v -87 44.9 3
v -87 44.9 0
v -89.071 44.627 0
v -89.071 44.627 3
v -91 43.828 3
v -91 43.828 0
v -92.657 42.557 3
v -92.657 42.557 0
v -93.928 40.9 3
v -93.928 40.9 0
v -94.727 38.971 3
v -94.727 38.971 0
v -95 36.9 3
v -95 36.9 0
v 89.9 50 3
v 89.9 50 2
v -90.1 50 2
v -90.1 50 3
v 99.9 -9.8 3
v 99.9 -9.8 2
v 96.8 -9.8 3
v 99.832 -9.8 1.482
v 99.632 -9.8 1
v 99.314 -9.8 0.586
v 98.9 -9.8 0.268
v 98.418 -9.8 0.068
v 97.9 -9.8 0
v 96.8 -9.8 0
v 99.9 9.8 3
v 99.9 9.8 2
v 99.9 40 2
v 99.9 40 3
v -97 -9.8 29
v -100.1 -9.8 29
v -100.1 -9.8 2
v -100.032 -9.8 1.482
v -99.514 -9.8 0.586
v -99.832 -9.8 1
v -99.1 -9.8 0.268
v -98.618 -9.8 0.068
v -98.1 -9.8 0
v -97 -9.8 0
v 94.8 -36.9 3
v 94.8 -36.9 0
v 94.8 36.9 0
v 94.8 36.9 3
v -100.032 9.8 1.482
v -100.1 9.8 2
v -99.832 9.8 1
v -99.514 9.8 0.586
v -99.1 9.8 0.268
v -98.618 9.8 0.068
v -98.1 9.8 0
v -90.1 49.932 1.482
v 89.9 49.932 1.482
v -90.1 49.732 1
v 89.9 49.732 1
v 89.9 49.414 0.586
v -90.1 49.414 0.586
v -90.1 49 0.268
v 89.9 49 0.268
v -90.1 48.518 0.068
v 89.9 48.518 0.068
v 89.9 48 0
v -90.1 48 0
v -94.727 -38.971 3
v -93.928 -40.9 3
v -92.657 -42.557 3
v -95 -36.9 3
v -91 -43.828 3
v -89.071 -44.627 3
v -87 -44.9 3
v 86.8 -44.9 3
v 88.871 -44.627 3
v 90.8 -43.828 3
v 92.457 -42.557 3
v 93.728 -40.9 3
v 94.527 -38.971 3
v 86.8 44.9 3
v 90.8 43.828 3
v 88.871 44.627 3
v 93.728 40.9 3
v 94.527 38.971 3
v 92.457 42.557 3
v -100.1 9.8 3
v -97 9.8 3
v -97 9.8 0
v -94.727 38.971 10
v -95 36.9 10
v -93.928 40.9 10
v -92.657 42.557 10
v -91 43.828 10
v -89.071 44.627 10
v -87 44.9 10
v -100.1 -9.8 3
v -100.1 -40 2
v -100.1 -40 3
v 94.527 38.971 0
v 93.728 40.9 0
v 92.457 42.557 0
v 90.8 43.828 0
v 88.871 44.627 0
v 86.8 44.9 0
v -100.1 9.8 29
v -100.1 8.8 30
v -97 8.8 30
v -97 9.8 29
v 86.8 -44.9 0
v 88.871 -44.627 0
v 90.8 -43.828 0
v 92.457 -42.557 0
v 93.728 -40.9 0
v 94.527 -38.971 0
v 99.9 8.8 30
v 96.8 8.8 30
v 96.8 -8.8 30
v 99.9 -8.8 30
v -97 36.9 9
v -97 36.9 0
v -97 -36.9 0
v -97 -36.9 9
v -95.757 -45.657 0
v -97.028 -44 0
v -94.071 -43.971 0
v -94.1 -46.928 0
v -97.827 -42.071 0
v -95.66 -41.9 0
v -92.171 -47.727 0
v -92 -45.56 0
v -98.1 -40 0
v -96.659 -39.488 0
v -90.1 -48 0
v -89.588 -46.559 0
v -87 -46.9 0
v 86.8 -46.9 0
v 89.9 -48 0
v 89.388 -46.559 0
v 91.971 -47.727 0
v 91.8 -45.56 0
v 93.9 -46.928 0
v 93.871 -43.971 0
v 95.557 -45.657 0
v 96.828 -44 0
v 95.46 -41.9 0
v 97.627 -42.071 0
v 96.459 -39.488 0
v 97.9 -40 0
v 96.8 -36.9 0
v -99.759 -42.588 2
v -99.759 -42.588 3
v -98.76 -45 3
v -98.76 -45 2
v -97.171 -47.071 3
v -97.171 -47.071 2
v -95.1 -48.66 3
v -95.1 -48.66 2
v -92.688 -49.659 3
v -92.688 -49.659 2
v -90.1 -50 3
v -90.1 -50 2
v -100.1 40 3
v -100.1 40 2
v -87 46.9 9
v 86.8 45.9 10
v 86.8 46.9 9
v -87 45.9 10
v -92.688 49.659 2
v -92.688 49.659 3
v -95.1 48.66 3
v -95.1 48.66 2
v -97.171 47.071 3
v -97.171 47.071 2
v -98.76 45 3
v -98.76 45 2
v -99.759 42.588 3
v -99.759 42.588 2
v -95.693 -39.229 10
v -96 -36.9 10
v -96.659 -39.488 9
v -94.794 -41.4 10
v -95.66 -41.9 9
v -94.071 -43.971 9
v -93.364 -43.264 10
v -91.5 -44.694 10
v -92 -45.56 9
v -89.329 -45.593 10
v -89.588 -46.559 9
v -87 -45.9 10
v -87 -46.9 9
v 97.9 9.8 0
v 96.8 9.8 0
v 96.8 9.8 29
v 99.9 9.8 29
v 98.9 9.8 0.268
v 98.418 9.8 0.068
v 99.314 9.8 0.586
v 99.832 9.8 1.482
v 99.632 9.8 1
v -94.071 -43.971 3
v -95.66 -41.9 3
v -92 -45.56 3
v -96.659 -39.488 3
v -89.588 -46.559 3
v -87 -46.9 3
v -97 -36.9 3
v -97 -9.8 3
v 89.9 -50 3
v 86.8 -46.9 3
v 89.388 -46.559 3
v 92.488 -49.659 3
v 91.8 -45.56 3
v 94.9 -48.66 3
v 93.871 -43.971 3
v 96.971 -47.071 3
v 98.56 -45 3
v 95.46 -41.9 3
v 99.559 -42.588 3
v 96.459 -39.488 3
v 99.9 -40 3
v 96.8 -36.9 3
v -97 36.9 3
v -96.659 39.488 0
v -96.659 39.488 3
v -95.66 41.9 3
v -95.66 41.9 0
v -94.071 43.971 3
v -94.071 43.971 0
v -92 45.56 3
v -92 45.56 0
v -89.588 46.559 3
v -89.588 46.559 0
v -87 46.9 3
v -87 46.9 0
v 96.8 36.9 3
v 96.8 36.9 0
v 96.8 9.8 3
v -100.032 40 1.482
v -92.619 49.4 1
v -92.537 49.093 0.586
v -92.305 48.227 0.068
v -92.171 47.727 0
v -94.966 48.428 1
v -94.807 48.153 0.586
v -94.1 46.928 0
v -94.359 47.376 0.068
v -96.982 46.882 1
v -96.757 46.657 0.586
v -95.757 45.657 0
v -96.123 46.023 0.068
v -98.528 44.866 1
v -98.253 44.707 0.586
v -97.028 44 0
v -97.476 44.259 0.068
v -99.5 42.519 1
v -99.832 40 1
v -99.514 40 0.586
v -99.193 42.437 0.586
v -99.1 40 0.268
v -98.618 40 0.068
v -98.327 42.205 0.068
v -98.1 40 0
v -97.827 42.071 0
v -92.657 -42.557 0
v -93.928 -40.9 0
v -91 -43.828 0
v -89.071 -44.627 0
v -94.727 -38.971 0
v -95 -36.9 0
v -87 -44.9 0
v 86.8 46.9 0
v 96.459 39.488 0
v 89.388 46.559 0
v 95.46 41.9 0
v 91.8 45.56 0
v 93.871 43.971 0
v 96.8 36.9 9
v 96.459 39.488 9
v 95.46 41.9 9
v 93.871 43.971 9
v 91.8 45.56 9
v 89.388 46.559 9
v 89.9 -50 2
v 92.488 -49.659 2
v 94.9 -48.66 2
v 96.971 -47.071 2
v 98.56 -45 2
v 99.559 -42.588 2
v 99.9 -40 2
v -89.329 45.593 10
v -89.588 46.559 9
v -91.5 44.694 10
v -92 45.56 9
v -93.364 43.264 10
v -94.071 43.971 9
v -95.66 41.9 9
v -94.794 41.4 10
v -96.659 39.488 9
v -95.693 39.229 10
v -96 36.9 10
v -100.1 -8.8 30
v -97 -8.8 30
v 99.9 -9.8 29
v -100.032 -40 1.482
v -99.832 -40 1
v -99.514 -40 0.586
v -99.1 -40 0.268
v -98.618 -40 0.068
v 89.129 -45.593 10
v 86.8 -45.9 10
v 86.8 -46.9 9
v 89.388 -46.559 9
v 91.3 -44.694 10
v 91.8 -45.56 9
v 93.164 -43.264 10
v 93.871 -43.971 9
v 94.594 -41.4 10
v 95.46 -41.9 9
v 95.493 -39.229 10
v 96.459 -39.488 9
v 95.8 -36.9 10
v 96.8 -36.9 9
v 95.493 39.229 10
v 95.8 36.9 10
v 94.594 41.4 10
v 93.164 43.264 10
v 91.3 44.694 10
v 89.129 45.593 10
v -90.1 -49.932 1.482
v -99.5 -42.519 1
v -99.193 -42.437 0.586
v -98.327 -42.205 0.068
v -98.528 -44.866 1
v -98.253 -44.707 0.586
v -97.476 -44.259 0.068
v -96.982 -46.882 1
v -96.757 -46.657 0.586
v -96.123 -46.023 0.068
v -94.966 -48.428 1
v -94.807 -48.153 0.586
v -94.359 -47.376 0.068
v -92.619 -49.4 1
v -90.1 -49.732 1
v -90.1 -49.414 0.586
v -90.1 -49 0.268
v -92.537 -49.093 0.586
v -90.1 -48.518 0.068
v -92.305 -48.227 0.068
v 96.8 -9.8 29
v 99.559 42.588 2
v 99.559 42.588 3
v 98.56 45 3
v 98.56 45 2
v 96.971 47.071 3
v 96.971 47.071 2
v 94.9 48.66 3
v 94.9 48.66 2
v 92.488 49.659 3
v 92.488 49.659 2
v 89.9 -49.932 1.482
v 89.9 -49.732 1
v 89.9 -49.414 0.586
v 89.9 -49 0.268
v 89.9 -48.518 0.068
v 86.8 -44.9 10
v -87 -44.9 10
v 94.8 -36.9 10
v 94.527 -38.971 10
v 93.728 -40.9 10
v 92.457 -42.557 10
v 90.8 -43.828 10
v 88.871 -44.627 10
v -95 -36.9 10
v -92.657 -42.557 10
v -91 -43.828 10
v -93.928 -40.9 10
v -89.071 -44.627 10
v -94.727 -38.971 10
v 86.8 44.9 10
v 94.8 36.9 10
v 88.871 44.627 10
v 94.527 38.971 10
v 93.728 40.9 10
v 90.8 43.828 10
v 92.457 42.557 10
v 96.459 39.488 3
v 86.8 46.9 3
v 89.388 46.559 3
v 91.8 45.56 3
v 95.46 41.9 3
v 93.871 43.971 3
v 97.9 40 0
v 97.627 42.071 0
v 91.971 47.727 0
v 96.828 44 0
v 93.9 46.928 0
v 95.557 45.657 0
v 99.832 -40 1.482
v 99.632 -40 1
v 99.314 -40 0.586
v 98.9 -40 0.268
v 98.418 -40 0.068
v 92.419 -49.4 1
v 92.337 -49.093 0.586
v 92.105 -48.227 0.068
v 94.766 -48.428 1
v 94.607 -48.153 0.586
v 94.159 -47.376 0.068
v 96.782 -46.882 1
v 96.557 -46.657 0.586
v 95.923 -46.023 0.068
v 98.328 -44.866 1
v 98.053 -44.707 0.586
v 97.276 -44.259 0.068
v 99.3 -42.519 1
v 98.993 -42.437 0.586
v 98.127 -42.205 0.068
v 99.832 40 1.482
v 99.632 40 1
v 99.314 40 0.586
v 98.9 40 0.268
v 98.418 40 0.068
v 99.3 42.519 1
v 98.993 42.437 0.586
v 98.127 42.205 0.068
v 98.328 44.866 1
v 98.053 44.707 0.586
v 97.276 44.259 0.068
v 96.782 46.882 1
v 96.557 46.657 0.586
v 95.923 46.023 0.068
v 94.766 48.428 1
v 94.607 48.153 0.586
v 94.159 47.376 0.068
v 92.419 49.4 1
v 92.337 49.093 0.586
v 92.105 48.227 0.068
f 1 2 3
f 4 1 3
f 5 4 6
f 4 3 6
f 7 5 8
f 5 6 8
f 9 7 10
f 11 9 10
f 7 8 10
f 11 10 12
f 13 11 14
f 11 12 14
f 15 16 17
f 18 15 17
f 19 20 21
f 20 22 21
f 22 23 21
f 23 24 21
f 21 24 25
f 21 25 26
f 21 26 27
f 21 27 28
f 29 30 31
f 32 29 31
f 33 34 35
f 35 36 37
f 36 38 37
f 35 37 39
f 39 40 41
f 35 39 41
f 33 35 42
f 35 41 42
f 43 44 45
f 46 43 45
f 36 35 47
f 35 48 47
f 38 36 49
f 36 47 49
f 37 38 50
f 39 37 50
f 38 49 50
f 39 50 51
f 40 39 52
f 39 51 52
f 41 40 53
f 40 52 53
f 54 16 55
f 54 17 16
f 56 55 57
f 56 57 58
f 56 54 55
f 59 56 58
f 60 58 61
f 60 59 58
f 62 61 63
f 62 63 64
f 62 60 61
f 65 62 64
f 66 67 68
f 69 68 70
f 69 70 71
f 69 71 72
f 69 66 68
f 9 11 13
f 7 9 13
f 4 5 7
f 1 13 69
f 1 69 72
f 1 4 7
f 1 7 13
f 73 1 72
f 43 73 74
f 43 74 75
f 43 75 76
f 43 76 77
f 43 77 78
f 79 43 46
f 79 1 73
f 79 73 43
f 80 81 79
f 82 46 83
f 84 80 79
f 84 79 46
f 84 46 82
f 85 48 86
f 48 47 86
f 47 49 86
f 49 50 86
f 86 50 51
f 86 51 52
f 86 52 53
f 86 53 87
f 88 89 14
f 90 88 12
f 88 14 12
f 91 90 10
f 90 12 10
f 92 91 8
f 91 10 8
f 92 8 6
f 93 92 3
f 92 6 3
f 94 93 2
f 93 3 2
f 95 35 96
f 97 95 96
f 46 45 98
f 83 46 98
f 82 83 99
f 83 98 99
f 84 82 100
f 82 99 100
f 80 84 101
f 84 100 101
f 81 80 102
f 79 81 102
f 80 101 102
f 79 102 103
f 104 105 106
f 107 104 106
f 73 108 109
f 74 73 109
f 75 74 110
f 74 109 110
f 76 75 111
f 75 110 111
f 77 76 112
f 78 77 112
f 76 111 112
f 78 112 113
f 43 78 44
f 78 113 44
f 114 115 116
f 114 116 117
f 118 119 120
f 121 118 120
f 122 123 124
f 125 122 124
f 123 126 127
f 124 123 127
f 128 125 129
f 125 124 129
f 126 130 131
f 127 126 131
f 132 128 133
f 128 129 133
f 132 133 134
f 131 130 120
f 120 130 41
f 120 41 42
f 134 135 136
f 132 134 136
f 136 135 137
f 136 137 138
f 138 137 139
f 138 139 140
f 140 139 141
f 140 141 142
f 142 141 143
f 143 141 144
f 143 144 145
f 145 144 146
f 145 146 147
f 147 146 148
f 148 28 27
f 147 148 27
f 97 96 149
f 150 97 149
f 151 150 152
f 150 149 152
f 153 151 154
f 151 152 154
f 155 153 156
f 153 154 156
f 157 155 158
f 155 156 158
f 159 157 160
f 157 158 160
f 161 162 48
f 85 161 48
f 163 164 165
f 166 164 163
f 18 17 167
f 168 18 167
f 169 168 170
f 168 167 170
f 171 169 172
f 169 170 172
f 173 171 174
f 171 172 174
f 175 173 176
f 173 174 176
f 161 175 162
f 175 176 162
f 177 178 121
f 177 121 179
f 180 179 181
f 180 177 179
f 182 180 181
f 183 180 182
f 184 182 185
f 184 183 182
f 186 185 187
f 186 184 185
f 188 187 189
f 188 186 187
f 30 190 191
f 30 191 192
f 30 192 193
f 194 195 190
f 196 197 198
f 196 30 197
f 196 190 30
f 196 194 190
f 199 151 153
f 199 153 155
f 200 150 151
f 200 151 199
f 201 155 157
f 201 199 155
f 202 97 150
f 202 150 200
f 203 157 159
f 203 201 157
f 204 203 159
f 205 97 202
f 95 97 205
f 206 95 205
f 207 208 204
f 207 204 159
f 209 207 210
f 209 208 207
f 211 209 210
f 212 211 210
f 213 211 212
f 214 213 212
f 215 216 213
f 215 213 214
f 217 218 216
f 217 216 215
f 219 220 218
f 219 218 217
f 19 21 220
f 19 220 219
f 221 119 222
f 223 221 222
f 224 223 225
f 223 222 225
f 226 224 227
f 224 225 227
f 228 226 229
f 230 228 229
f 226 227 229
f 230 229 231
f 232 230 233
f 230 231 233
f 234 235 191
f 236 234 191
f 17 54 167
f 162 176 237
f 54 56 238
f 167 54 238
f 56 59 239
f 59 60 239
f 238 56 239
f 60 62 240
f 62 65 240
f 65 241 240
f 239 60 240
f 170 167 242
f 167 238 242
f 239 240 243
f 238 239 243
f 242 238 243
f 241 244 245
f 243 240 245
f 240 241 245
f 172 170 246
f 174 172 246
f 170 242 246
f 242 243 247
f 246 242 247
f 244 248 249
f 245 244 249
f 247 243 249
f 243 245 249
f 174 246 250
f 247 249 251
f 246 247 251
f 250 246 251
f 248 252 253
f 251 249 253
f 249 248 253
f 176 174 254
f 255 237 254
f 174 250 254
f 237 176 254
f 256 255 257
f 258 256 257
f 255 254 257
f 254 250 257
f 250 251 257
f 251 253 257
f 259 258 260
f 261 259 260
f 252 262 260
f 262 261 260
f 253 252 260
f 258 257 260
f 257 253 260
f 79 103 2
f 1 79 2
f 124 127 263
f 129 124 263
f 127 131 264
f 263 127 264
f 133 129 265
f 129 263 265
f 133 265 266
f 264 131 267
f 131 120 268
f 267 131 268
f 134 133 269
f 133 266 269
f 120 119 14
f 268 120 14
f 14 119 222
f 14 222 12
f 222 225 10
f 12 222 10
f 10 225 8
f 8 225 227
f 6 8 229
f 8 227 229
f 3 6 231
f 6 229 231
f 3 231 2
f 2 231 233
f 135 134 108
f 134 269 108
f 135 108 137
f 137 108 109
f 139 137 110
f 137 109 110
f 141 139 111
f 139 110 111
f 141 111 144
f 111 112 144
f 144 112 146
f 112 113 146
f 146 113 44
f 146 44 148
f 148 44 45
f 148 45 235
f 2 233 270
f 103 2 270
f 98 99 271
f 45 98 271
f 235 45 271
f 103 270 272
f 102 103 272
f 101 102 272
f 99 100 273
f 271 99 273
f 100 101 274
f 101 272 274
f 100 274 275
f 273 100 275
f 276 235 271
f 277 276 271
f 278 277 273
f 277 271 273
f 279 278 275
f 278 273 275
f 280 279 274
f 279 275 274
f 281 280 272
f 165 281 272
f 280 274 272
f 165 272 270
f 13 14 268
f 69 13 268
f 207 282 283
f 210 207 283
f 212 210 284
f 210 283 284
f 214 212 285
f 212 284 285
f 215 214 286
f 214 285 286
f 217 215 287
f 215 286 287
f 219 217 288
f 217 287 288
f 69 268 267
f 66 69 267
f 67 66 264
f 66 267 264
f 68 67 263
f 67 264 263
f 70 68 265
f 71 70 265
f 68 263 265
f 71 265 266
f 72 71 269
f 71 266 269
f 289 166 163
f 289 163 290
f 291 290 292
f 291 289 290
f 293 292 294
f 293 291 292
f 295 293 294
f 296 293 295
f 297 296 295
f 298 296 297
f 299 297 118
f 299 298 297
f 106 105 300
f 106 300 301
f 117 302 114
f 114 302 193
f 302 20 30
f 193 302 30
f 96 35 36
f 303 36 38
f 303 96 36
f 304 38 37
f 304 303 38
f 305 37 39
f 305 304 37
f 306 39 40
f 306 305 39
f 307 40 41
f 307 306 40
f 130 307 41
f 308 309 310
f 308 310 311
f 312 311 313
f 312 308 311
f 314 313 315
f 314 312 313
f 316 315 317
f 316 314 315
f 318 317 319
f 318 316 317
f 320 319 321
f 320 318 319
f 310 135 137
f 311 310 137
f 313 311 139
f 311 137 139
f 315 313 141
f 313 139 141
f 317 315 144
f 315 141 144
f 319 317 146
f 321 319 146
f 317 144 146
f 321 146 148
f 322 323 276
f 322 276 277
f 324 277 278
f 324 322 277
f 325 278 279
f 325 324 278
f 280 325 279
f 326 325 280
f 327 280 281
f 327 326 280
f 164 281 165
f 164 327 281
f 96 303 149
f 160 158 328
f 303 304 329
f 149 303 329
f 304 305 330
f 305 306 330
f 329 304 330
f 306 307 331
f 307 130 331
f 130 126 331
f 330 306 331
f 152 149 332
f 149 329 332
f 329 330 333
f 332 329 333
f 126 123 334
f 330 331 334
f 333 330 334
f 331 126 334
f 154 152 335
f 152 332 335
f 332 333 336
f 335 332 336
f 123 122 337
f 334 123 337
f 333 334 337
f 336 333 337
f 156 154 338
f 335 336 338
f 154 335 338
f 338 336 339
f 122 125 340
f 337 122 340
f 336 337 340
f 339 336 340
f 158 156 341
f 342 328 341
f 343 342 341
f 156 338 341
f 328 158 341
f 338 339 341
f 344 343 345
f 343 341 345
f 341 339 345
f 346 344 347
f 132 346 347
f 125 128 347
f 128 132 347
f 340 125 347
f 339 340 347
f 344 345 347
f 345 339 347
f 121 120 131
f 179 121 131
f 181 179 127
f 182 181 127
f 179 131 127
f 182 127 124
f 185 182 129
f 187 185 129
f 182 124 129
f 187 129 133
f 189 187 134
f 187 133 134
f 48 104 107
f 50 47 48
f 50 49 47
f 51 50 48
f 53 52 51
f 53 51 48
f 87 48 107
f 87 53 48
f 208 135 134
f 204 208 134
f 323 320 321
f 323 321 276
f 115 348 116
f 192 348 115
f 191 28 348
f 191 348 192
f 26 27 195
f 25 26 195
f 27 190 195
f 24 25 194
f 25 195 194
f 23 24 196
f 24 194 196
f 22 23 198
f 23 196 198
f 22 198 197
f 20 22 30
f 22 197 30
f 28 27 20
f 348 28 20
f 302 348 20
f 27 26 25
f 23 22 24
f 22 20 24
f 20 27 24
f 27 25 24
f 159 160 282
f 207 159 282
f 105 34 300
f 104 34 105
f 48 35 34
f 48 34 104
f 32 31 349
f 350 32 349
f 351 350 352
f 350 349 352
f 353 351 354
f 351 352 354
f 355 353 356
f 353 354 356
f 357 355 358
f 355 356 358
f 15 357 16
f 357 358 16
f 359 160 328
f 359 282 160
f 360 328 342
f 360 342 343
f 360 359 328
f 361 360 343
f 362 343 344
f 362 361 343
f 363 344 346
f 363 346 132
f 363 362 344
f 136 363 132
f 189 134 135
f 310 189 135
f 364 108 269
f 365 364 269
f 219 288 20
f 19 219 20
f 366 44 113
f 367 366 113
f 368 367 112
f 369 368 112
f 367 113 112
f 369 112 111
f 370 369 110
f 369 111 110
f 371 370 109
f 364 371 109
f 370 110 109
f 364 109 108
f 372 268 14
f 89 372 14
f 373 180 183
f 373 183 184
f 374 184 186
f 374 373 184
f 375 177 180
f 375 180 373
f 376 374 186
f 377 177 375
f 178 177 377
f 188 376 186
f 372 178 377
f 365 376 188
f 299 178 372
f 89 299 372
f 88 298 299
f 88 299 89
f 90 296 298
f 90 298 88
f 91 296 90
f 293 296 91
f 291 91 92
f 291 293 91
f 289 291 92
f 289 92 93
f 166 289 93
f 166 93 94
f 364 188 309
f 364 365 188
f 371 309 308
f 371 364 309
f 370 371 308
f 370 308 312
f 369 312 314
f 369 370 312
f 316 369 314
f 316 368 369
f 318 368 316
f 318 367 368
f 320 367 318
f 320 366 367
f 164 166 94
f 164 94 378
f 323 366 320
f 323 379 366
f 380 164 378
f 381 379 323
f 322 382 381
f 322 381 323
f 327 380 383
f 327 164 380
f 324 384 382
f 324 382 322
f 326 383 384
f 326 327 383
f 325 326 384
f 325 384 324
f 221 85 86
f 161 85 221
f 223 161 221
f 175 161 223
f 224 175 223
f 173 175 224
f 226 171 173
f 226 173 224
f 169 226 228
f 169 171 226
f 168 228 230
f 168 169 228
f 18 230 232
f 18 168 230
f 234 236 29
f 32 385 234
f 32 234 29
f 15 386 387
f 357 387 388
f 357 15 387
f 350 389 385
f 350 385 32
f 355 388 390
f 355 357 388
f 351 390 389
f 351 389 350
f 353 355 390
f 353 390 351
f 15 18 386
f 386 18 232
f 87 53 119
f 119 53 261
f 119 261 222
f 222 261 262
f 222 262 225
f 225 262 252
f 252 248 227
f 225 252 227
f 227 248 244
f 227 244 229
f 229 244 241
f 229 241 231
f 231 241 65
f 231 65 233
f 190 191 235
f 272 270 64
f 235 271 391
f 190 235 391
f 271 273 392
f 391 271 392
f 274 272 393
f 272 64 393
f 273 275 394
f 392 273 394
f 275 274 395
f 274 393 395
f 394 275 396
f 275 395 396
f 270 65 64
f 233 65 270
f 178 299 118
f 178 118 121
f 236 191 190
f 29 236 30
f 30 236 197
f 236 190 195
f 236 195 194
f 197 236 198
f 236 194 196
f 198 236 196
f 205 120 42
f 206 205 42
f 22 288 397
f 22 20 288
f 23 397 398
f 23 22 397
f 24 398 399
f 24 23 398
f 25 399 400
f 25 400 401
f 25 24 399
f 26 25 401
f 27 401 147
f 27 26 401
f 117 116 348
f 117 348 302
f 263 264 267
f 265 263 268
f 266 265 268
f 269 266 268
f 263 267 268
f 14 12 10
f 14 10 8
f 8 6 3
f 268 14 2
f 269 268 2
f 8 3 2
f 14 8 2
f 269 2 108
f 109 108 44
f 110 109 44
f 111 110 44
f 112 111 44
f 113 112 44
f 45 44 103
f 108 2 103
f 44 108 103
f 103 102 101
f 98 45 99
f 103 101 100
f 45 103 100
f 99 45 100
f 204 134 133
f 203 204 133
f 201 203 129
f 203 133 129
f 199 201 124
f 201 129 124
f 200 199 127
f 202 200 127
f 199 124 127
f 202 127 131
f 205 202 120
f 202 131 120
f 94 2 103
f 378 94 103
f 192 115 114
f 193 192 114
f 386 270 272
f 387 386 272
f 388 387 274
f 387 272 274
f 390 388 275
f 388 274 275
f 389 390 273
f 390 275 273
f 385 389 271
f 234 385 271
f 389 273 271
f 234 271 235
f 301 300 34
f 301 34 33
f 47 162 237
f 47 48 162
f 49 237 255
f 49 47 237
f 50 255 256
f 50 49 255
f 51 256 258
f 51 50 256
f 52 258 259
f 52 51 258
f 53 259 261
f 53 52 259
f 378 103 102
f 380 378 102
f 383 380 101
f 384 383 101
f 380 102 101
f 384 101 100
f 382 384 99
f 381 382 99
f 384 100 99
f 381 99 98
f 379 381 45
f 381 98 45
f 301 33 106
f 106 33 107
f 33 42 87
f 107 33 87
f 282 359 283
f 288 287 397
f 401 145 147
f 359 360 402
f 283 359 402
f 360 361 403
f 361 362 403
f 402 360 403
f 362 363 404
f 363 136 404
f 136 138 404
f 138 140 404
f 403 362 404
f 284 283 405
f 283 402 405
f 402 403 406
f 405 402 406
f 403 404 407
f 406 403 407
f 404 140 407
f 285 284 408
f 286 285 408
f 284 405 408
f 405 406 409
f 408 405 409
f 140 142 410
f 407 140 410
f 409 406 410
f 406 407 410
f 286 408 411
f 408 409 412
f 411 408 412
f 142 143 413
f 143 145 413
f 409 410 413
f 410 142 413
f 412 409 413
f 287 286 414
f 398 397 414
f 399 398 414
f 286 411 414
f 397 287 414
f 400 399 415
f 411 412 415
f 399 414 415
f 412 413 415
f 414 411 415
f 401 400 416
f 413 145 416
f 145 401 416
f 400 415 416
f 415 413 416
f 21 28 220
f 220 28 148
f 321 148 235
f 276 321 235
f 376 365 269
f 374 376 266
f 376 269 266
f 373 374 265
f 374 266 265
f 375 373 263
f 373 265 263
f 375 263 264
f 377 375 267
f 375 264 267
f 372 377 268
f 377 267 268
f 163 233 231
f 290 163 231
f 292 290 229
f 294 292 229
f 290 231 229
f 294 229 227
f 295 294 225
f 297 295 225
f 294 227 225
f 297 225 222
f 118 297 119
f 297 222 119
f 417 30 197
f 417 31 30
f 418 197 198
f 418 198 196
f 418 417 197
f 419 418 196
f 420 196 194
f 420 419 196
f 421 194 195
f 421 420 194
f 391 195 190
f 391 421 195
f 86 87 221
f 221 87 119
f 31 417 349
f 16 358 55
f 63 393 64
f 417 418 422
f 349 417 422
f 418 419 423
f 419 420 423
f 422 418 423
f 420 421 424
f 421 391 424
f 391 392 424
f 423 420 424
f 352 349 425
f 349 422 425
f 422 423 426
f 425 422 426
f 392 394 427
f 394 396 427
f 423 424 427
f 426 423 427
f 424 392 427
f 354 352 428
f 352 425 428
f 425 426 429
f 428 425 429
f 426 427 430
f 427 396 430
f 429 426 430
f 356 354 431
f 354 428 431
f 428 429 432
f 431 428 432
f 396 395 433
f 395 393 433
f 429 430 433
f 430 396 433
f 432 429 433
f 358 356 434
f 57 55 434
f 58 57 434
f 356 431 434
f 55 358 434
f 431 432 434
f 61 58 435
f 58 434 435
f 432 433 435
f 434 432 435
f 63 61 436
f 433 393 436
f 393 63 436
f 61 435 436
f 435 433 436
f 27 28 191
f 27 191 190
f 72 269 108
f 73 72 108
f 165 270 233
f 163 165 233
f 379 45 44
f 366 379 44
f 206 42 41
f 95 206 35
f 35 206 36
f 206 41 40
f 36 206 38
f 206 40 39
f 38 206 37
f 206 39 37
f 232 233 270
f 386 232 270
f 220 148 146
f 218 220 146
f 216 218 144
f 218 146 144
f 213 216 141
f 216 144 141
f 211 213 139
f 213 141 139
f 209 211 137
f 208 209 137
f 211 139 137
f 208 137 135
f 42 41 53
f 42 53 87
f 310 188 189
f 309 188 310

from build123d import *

# Parameters (mm, degrees)
F1_DEPTH  = 3
F2_DEPTH  = 10
F0_W      = 3.1
F0_H      = 19.6
F3_DEPTH  = 30
F4_SIZE   = 1
F4_2_SIZE = 1
F5_R      = 2
F5_2_R    = 2


with BuildPart() as f1:
    # F0 (on Top) → F1 (new body)
    with BuildSketch(Plane.XY):
        with BuildLine():
            Line((96.8, 36.9), (96.8, 9.8))
            Line((96.8, 9.8), (99.9, 9.8))
            Line((99.9, 9.8), (99.9, 40))
            ThreePointArc((99.9, 40), (96.971068, 47.071068), (89.9, 50))
            Line((89.9, 50), (-90.1, 50))
            ThreePointArc((-90.1, 50), (-97.171068, 47.071068), (-100.1, 40))
            Line((-100.1, 40), (-100.1, 9.8))
            Line((-100.1, 9.8), (-97, 9.8))
            Line((-97, 9.8), (-97, 36.9))
            ThreePointArc((-97, 36.9), (-94.071068, 43.971068), (-87, 46.9))
            Line((-87, 46.9), (86.8, 46.9))
            ThreePointArc((86.8, 46.9), (93.871068, 43.971068), (96.8, 36.9))
        make_face()
        with BuildLine():
            ThreePointArc((94.8, 36.9), (92.456854, 42.556854), (86.8, 44.9))
            Line((86.8, 44.9), (-87, 44.9))
            ThreePointArc((-87, 44.9), (-92.656854, 42.556854), (-95, 36.9))
            Line((-95, 36.9), (-95, -36.9))
            ThreePointArc((-95, -36.9), (-92.656854, -42.556854), (-87, -44.9))
            Line((-87, -44.9), (86.8, -44.9))
            ThreePointArc((86.8, -44.9), (92.456854, -42.556854), (94.8, -36.9))
            Line((94.8, -36.9), (94.8, 36.9))
        make_face()
        with BuildLine():
            ThreePointArc((96.8, -36.9), (93.871068, -43.971068), (86.8, -46.9))
            Line((86.8, -46.9), (-87, -46.9))
            ThreePointArc((-87, -46.9), (-94.071068, -43.971068), (-97, -36.9))
            Line((-97, -36.9), (-97, -9.8))
            Line((-97, -9.8), (-100.1, -9.8))
            Line((-100.1, -9.8), (-100.1, -40))
            ThreePointArc((-100.1, -40), (-97.171068, -47.071068), (-90.1, -50))
            Line((-90.1, -50), (89.9, -50))
            ThreePointArc((89.9, -50), (96.971068, -47.071068), (99.9, -40))
            Line((99.9, -40), (99.9, -9.8))
            Line((99.9, -9.8), (96.8, -9.8))
            Line((96.8, -9.8), (96.8, -36.9))
        make_face()
    extrude(amount=F1_DEPTH)

    # F5
    f5_edges = [f1.edges().sort_by_distance(p)[0] for p in [
        (99.9, -24.9, 0),
        (99.9, 24.9, 0),
    ]]
    fillet(f5_edges, radius=F5_R)


with BuildPart() as f2:
    # F0 (on Top) → F2 (new body)
    with BuildSketch(Plane.XY):
        with BuildLine():
            Line((-87, -46.9), (86.8, -46.9))
            ThreePointArc((86.8, -46.9), (93.871068, -43.971068), (96.8, -36.9))
            Line((96.8, -36.9), (96.8, -9.8))
            Line((96.8, -9.8), (96.8, 9.8))
            Line((96.8, 9.8), (96.8, 36.9))
            ThreePointArc((96.8, 36.9), (93.871068, 43.971068), (86.8, 46.9))
            Line((86.8, 46.9), (-87, 46.9))
            ThreePointArc((-87, 46.9), (-94.071068, 43.971068), (-97, 36.9))
            Line((-97, 36.9), (-97, 9.8))
            Line((-97, 9.8), (-97, -9.8))
            Line((-97, -9.8), (-97, -36.9))
            ThreePointArc((-97, -36.9), (-94.071068, -43.971068), (-87, -46.9))
        make_face()
        with BuildLine():
            Line((-87, 44.9), (86.8, 44.9))
            ThreePointArc((86.8, 44.9), (92.456854, 42.556854), (94.8, 36.9))
            Line((94.8, 36.9), (94.8, -36.9))
            ThreePointArc((94.8, -36.9), (92.456854, -42.556854), (86.8, -44.9))
            Line((86.8, -44.9), (-87, -44.9))
            ThreePointArc((-87, -44.9), (-92.656854, -42.556854), (-95, -36.9))
            Line((-95, -36.9), (-95, 36.9))
            ThreePointArc((-95, 36.9), (-92.656854, 42.556854), (-87, 44.9))
        make_face(mode=Mode.SUBTRACT)
    extrude(amount=F2_DEPTH)

    # F4#2
    f4_2_edges = [f2.edges().sort_by_distance(p)[0] for p in [
        (96.8, 0, 10),
    ]]
    chamfer(f4_2_edges, length=F4_2_SIZE)


with BuildPart() as f3:
    # F0 (on Top) → F3 (new body)
    with BuildSketch(Plane.XY):
        with Locations((-98.55, 0)):
            Rectangle(F0_W, F0_H)
        with Locations((98.35, 0)):
            Rectangle(F0_W, F0_H)
    extrude(amount=F3_DEPTH)

    # F4
    f4_edges = [f3.edges().sort_by_distance(p)[0] for p in [
        (-98.55, -9.8, 30),
        (-98.55, 9.8, 30),
        (98.35, 9.8, 30),
        (98.35, -9.8, 30),
    ]]
    chamfer(f4_edges, length=F4_SIZE)

    # F5#2
    f5_2_edges = [f3.edges().sort_by_distance(p)[0] for p in [
        (99.9, 0, 0),
        (-100.1, 0, 0),
    ]]
    fillet(f5_2_edges, radius=F5_2_R)


solid = Compound([f1.part, f2.part, f3.part])
